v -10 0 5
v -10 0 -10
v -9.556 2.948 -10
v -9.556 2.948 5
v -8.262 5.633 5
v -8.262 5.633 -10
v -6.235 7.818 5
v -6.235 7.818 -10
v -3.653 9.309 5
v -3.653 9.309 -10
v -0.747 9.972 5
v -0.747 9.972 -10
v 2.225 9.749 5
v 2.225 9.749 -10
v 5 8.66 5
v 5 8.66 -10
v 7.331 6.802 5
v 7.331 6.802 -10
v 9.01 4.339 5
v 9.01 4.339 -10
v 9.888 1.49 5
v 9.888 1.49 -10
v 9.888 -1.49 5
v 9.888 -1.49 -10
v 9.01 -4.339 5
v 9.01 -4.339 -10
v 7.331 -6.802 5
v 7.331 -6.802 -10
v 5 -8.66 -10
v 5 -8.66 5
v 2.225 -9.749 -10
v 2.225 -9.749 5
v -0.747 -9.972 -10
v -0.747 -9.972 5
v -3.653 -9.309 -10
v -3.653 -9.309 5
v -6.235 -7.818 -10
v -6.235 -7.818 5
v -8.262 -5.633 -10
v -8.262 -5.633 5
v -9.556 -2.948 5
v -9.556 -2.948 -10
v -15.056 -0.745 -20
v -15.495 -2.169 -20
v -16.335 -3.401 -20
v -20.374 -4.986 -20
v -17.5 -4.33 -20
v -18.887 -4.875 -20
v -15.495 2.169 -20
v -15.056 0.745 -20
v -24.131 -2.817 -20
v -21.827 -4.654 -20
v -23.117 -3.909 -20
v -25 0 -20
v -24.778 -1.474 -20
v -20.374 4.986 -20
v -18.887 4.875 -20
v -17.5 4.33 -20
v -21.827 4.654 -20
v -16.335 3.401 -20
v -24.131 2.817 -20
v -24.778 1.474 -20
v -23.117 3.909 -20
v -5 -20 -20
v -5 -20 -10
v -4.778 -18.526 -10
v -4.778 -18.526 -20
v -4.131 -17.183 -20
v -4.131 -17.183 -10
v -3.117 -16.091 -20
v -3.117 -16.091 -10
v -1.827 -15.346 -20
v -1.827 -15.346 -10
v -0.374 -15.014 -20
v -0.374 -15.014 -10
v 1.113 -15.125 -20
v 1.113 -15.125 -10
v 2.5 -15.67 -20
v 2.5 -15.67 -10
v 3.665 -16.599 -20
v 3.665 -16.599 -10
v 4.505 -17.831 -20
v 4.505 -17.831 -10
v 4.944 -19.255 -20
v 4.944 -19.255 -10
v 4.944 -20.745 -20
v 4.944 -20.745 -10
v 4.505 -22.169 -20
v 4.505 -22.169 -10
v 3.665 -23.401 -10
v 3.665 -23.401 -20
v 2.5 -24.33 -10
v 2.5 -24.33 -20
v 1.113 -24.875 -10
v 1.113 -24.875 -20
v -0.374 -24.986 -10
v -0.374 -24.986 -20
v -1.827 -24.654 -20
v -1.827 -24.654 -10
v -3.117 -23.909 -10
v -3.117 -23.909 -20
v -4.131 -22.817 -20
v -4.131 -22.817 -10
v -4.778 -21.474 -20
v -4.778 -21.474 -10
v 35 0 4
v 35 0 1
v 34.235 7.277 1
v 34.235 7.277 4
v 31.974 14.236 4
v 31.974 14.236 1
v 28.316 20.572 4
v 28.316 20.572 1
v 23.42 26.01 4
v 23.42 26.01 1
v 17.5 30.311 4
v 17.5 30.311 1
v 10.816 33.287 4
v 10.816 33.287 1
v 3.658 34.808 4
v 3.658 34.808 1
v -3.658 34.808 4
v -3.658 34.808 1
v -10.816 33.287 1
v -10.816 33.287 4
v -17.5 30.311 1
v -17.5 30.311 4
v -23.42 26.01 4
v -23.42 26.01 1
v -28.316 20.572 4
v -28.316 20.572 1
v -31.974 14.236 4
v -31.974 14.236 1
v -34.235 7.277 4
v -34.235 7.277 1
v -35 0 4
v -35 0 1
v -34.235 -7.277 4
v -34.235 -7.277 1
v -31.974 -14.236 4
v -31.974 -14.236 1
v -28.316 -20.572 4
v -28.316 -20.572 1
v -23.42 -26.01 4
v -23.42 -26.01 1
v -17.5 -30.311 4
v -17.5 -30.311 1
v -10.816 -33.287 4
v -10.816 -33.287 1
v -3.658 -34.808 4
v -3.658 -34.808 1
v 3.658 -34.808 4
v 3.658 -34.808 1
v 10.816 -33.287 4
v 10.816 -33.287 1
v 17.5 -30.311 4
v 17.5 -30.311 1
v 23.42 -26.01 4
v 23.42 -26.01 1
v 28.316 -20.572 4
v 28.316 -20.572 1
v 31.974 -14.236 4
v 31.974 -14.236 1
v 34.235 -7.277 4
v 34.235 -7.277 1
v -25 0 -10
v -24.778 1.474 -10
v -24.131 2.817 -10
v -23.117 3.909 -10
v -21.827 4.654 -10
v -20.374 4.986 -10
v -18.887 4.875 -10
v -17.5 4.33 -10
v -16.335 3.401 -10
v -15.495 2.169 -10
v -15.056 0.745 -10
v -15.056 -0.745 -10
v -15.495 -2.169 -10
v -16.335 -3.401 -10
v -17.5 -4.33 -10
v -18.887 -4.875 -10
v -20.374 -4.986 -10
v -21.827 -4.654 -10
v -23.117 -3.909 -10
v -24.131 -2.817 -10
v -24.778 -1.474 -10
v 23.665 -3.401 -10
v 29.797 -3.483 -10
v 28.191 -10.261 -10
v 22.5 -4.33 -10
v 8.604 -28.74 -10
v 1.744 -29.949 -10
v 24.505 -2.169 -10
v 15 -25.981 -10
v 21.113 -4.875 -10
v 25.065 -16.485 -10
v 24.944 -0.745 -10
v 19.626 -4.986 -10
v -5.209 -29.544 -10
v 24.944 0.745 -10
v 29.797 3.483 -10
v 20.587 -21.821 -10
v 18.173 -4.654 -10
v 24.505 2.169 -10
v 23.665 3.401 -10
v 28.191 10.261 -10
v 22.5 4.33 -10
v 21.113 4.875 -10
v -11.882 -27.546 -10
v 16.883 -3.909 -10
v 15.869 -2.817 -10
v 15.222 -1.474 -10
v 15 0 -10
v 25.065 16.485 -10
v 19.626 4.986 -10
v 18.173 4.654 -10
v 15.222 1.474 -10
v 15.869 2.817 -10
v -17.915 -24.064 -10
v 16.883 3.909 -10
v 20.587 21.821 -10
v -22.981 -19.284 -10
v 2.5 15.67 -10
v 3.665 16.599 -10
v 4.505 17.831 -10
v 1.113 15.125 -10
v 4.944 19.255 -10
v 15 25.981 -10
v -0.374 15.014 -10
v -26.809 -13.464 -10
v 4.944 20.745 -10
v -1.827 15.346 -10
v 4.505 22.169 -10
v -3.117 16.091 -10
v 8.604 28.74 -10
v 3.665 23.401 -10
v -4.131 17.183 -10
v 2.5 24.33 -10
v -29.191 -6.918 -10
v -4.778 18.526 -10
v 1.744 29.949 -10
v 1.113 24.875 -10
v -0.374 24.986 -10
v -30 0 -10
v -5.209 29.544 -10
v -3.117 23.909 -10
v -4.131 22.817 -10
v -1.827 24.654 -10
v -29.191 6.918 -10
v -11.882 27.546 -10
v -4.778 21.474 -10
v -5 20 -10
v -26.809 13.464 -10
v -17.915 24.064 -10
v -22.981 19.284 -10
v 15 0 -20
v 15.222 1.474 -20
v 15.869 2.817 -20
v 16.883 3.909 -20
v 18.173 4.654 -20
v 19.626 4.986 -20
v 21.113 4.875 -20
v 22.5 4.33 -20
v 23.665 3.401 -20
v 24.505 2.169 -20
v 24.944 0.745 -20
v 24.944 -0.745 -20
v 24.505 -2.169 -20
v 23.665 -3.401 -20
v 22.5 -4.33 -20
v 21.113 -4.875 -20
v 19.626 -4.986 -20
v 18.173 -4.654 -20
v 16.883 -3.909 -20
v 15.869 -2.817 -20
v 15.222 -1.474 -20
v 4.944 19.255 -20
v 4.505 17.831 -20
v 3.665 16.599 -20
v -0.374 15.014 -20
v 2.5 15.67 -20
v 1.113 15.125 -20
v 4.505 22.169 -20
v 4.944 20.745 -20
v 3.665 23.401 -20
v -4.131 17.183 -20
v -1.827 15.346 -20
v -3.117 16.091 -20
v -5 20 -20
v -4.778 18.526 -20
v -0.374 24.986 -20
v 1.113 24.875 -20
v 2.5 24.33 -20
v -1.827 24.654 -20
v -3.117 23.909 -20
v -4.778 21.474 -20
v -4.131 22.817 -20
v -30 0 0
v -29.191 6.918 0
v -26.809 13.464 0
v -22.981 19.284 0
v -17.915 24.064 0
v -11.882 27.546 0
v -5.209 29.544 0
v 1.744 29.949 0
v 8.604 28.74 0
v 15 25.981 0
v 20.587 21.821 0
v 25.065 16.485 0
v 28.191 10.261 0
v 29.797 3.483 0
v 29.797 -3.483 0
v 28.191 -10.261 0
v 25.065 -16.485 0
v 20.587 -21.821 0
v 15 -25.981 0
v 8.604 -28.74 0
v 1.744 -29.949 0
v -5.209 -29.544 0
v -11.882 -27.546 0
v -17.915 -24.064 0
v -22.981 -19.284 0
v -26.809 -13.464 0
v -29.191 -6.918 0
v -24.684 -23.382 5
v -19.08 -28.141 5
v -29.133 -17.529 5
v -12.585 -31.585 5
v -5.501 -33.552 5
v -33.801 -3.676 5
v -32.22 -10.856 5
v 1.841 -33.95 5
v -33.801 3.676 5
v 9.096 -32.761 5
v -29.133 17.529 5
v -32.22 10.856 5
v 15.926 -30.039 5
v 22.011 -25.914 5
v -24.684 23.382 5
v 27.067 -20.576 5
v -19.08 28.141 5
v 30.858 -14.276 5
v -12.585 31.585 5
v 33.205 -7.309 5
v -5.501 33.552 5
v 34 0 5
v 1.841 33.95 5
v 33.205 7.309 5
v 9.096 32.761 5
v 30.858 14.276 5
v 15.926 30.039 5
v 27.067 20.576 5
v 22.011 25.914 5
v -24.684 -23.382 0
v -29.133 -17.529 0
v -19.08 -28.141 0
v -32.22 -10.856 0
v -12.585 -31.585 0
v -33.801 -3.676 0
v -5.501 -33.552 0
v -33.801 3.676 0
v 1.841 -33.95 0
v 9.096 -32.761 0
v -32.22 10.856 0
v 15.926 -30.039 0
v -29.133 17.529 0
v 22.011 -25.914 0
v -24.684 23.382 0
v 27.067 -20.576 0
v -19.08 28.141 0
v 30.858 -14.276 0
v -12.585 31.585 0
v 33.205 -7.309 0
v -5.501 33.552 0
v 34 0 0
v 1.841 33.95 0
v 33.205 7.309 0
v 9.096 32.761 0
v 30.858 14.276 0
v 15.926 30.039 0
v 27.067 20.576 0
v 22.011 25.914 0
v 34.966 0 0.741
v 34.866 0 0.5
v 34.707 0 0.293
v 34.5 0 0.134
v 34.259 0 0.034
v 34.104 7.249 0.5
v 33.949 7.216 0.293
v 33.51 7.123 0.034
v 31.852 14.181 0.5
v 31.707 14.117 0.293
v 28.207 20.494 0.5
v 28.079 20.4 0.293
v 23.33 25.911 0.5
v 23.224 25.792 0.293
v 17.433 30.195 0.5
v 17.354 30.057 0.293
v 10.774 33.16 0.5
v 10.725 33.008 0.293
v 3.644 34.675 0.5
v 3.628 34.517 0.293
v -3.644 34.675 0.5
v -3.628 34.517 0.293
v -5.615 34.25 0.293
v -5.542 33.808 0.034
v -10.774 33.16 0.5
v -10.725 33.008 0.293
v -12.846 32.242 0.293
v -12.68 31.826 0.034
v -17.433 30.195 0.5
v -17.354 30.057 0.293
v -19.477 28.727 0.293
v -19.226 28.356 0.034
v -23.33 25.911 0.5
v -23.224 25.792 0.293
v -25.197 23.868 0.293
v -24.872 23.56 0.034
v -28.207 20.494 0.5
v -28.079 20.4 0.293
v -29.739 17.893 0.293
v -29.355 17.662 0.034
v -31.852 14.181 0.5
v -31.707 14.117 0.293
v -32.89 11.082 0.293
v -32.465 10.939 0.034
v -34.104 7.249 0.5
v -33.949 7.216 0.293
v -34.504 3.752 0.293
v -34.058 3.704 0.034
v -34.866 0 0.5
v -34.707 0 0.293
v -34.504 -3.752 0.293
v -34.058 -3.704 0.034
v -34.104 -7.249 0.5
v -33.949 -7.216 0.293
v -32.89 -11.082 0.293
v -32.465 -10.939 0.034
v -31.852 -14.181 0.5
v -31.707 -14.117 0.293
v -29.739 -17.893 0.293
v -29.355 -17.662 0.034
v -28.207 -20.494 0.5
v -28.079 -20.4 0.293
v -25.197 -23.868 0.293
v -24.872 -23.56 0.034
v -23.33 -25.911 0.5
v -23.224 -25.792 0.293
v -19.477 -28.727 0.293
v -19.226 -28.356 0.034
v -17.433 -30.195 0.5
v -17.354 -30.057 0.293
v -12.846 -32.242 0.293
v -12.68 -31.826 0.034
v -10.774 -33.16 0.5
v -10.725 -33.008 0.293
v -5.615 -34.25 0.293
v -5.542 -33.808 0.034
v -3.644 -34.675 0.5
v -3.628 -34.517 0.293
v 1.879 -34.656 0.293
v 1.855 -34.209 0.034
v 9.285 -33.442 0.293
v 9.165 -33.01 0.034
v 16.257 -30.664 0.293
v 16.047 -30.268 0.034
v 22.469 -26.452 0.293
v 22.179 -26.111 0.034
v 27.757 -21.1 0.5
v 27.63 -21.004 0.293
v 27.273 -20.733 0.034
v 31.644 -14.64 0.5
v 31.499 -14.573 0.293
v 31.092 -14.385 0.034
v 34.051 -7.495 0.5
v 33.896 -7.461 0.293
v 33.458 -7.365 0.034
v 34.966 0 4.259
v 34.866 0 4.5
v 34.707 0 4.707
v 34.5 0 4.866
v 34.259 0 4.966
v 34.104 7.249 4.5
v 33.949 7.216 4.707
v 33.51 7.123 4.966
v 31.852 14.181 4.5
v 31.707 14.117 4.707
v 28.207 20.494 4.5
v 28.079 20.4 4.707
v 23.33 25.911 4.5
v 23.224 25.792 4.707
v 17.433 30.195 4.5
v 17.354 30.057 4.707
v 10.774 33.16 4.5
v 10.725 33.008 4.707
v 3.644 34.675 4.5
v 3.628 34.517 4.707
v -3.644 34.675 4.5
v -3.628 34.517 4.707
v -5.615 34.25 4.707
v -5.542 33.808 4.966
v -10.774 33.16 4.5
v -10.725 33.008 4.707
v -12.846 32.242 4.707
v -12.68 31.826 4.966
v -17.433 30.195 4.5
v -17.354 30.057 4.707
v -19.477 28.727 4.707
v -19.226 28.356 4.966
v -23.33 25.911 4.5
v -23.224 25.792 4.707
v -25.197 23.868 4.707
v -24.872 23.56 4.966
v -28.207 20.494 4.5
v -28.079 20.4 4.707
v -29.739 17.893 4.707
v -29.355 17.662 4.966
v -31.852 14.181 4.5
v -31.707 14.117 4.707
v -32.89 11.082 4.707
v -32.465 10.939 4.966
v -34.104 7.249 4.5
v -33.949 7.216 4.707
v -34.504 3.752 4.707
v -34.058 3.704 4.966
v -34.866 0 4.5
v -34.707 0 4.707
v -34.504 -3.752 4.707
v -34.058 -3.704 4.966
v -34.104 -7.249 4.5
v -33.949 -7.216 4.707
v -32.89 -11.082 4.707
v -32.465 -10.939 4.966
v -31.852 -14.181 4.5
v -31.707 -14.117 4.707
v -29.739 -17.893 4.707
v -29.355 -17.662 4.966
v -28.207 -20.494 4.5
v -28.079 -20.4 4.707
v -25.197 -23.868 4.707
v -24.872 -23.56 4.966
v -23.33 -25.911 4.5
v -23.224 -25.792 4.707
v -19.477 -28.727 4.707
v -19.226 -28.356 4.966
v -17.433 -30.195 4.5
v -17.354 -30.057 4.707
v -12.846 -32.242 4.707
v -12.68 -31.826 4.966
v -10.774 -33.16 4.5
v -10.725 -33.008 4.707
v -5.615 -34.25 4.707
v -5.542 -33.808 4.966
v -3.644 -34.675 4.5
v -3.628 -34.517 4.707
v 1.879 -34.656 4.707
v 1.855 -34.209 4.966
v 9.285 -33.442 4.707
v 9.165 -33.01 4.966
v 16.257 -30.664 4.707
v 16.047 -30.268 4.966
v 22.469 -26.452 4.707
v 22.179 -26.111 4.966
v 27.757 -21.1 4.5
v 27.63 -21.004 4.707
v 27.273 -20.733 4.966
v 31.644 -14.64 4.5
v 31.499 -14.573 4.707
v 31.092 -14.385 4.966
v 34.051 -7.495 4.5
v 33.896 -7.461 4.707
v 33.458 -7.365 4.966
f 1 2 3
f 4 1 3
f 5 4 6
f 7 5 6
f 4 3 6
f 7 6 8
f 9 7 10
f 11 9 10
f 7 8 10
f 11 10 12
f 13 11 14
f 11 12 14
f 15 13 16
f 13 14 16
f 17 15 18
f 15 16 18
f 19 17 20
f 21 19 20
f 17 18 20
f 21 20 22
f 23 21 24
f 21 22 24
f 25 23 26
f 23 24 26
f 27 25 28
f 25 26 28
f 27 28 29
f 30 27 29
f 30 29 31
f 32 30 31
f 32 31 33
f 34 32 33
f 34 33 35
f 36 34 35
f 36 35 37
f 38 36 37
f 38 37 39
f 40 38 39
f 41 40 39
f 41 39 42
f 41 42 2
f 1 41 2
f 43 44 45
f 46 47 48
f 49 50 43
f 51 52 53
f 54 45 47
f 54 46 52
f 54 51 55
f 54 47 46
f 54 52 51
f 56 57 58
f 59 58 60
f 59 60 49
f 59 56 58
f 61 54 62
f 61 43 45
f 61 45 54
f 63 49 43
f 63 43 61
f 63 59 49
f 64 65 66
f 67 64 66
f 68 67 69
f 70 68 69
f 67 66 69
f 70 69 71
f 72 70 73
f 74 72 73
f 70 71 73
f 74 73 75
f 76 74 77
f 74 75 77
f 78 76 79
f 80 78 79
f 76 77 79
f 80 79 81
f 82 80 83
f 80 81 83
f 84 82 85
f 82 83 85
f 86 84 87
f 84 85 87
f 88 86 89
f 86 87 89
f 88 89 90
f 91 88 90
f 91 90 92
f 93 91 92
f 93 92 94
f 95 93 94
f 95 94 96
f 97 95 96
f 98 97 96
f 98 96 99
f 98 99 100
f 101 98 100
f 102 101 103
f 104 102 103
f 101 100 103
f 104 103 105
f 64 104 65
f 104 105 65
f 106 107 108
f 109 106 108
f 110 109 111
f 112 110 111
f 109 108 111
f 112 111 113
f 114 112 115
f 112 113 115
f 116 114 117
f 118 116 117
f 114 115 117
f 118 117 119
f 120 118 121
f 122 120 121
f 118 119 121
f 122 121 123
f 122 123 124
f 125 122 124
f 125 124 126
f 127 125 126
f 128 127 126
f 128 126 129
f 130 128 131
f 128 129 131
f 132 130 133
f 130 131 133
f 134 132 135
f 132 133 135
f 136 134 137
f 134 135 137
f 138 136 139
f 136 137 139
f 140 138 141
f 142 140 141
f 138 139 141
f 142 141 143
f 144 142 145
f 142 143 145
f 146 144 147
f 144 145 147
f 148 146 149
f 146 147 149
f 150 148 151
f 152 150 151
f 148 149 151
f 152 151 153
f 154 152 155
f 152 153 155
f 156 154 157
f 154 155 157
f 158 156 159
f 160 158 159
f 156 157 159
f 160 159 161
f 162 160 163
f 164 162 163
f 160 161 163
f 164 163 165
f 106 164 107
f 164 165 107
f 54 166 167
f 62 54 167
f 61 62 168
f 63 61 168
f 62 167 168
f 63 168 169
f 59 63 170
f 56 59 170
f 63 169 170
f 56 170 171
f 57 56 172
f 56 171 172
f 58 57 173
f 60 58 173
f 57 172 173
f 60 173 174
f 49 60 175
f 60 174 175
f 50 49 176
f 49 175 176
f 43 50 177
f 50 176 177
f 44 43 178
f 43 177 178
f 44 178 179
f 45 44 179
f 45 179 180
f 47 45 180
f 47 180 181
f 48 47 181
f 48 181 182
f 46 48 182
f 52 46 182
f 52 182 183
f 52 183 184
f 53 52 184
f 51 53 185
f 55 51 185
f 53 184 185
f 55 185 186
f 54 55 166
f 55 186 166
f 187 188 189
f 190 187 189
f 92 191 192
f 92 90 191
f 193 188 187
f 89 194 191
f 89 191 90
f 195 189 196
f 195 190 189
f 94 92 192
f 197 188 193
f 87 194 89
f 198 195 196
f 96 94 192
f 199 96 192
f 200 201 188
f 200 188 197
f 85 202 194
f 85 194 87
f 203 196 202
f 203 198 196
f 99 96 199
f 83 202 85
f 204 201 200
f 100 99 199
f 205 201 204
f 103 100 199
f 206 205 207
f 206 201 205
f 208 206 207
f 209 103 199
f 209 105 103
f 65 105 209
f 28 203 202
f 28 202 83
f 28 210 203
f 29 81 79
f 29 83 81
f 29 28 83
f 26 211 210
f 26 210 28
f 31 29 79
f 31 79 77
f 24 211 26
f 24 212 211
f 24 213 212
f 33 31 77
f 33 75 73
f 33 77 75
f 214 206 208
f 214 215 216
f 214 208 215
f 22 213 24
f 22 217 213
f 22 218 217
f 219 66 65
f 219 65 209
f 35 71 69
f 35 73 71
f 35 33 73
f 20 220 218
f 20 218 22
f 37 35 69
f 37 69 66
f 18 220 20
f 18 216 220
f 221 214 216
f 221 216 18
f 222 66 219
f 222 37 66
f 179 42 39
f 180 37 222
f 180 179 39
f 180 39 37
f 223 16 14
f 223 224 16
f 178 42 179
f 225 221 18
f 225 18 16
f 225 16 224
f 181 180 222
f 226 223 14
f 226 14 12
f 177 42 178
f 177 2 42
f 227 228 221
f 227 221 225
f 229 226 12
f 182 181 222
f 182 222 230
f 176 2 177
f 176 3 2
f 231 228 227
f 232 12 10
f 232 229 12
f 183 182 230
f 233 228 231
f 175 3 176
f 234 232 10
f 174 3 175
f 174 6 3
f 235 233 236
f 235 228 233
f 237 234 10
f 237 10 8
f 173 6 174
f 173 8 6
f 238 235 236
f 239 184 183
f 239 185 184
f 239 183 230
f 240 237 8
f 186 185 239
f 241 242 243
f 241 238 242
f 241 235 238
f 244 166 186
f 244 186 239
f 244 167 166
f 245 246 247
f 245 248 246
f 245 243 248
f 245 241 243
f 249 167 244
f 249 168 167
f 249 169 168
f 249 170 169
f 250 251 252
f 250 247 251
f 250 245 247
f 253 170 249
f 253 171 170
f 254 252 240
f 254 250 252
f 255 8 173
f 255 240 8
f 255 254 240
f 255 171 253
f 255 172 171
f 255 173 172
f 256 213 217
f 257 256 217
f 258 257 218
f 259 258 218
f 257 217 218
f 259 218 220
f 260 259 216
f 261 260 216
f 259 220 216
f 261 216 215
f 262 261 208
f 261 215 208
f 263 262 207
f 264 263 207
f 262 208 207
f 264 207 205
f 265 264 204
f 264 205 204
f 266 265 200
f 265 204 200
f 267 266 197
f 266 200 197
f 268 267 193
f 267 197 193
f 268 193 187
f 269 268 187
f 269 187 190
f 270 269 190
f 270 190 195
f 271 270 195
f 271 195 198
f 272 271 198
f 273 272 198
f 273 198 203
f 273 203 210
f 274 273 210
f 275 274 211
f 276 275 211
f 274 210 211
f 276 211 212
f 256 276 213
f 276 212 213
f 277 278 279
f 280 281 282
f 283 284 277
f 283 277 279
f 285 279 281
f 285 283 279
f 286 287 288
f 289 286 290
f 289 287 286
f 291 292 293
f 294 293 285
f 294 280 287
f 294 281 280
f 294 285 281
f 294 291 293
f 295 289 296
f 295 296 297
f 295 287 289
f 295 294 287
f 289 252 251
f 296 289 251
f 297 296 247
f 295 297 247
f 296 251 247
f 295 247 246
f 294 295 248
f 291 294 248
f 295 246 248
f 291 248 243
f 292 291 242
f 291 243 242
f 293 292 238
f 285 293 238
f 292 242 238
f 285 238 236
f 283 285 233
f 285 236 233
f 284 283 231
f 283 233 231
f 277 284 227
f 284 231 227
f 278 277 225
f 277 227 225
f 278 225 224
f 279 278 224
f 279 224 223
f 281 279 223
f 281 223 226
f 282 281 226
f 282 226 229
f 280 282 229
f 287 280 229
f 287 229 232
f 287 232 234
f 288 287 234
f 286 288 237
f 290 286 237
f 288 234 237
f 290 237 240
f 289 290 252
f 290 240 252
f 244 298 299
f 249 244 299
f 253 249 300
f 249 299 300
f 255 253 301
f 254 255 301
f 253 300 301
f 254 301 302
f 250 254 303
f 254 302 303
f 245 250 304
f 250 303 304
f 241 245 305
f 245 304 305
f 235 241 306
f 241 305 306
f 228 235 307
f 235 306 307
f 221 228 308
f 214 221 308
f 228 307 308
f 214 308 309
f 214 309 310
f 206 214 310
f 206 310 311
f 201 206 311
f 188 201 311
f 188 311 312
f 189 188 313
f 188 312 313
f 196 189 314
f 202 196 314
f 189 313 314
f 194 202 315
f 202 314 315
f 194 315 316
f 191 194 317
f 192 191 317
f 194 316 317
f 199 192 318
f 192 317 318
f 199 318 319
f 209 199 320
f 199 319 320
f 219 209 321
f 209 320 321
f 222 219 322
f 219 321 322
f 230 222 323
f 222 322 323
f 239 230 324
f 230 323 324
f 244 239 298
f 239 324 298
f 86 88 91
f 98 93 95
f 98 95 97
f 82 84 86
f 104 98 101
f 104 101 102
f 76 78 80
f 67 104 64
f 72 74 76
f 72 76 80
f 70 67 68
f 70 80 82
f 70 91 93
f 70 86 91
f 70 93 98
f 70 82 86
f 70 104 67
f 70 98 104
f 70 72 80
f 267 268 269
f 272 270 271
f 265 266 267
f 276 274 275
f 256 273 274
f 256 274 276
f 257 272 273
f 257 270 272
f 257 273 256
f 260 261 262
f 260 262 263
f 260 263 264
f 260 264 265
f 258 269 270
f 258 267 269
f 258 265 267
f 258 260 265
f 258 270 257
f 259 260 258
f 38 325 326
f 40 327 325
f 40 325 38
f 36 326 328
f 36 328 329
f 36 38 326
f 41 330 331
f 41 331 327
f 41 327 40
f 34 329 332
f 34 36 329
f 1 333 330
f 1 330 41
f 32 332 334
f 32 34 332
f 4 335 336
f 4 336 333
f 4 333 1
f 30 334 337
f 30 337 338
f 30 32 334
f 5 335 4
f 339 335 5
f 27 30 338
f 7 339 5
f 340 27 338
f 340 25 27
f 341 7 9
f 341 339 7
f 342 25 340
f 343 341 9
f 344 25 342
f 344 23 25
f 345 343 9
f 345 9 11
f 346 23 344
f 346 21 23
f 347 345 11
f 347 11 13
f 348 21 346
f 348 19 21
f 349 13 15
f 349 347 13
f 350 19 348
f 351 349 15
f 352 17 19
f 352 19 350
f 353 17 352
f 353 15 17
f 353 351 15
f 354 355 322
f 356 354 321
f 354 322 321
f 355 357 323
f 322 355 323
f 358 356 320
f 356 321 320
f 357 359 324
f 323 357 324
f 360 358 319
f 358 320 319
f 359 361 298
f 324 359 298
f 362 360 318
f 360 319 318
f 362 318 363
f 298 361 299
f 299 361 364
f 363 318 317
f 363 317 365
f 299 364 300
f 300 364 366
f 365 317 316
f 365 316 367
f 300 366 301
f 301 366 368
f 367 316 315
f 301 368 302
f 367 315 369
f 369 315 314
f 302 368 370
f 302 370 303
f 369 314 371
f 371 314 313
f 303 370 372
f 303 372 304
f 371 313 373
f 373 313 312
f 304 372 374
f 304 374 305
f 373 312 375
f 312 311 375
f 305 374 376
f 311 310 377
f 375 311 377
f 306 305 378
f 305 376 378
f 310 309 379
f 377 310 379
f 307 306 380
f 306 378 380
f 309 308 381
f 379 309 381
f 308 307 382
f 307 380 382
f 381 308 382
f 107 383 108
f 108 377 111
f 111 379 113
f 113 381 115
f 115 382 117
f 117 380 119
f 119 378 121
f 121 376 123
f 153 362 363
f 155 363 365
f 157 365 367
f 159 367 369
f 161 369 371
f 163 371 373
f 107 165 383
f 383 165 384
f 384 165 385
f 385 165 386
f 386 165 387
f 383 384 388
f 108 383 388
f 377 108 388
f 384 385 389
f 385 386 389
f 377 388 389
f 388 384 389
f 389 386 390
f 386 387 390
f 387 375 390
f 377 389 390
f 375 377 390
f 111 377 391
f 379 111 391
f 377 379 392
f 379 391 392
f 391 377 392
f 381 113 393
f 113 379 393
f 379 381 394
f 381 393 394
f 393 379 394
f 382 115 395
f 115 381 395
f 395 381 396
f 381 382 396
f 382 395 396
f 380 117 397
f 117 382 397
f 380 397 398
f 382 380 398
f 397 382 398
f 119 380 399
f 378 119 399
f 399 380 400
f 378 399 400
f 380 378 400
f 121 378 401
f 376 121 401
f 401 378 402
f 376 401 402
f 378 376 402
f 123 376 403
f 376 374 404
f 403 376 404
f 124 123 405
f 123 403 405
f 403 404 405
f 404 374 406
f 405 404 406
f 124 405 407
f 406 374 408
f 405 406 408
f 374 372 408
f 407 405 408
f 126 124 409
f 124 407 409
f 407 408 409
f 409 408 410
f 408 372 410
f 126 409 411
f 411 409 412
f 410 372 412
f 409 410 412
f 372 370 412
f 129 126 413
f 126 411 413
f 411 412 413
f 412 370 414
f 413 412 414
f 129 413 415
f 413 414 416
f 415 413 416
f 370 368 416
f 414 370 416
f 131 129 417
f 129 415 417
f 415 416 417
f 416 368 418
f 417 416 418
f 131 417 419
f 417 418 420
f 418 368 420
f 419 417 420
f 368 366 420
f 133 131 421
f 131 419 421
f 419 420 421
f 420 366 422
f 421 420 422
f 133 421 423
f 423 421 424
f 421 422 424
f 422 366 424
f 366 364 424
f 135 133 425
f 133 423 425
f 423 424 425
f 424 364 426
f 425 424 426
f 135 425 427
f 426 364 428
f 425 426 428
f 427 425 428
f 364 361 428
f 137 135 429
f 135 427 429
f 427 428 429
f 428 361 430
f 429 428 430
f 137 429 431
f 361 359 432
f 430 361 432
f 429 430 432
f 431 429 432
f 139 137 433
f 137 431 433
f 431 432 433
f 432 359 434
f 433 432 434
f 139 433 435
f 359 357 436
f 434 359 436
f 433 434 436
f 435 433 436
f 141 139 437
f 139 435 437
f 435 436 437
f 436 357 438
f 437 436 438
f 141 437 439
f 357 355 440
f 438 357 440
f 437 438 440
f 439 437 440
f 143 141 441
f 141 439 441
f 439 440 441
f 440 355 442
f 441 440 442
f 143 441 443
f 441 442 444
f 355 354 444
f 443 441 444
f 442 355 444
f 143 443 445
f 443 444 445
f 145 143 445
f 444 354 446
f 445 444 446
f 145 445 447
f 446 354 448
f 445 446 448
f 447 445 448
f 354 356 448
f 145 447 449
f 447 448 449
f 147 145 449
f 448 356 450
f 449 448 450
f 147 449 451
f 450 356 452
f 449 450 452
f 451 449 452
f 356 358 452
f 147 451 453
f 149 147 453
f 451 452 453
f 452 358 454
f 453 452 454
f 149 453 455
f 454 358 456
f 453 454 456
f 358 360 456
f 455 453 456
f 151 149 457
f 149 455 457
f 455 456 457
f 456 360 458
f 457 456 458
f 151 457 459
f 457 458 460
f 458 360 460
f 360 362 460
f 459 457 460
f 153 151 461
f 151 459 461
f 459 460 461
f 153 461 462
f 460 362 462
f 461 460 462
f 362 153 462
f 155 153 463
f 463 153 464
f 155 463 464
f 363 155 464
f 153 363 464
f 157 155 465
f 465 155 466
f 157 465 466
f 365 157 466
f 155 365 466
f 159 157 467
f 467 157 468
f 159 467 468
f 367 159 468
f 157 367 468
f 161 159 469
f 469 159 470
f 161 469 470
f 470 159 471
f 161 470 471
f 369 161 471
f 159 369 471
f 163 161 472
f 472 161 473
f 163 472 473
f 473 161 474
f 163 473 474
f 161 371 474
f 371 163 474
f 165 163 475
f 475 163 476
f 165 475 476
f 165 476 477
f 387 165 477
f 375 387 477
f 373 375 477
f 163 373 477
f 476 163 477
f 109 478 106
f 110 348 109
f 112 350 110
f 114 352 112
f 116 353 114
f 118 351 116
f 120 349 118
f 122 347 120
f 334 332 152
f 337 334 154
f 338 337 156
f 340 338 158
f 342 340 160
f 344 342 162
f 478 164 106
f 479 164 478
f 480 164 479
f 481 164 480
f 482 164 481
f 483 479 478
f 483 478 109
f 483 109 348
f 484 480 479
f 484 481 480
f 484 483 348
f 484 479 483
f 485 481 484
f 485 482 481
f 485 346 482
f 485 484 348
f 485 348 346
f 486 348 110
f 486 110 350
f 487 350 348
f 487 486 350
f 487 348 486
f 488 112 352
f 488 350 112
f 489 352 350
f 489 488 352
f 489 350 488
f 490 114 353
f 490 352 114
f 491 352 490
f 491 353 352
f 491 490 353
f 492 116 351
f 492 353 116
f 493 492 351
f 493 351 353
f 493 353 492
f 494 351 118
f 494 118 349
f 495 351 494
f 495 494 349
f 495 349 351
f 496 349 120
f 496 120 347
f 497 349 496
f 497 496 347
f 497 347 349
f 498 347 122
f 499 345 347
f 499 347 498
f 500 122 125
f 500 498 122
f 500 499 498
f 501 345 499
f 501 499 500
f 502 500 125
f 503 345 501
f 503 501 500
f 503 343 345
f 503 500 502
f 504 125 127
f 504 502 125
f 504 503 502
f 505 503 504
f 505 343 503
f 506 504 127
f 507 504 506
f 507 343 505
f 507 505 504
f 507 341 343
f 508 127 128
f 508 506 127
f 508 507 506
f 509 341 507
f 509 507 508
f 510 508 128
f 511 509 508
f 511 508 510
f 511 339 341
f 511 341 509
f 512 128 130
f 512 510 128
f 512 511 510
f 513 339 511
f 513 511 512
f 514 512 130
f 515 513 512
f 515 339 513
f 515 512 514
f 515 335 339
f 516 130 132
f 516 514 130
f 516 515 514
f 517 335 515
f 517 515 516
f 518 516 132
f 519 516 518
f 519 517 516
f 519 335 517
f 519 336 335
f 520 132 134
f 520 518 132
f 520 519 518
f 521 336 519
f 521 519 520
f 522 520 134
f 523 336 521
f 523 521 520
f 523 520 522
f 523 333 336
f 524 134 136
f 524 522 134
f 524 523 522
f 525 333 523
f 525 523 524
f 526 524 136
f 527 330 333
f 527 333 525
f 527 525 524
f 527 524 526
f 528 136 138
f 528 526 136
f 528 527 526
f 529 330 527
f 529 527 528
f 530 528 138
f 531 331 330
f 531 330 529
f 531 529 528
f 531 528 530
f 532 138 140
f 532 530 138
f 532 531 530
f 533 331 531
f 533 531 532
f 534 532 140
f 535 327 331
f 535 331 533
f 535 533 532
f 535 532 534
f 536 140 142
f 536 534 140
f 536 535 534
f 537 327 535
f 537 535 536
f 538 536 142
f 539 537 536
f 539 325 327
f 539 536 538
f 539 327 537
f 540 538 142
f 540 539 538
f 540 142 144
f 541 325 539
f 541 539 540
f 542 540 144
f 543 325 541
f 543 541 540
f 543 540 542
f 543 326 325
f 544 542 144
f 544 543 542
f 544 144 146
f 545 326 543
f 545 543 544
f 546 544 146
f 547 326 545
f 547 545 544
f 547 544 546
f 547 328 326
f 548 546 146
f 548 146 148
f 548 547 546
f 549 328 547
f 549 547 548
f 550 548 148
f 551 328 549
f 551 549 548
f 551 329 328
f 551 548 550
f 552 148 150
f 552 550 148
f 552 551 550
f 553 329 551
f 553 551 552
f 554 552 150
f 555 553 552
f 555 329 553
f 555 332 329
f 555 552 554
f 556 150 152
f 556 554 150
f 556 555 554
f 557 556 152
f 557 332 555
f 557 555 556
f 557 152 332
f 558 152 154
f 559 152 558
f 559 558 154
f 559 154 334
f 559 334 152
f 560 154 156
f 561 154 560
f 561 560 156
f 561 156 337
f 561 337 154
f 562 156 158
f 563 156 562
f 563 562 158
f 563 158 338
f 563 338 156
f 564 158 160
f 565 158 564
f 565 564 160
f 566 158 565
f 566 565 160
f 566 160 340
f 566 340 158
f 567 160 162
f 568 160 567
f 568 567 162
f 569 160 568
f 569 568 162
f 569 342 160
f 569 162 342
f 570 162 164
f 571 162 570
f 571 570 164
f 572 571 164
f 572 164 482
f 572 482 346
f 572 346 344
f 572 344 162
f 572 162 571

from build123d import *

# Parameters (mm, degrees)
SKETCH1_R           = 35
BOSS_EXTRUDE1_DEPTH = 5
FILLET1_R           = 1
SKETCH2_R           = 30
BOSS_EXTRUDE2_DEPTH = 10
SKETCH3_R           = 5
BOSS_EXTRUDE3_DEPTH = 10
SKETCH4_R           = 10
CUT_EXTRUDE1_DEPTH  = 16


with BuildPart() as part:
    # Sketch1 → Boss-Extrude1 (new body)
    with BuildSketch(Plane.XY):
        Circle(SKETCH1_R)
    extrude(amount=BOSS_EXTRUDE1_DEPTH)

    # Fillet1
    fillet1_edges = [part.edges().sort_by_distance(p)[0] for p in [
        (-35, 0, 0),
        (-35, 0, 5),
    ]]
    fillet(fillet1_edges, radius=FILLET1_R)

    # Sketch2 → Boss-Extrude2 (add)
    with BuildSketch(Plane(origin=(0, 0, 0), x_dir=(-1, 0, 0), z_dir=(0, 0, -1))):
        Circle(SKETCH2_R)
    extrude(amount=BOSS_EXTRUDE2_DEPTH)

    # Sketch3 → Boss-Extrude3 (add)
    with BuildSketch(Plane(origin=(0, 0, -10), x_dir=(-1, 0, 0), z_dir=(0, 0, -1))):
        with Locations((0, 20)):
            Circle(SKETCH3_R)
        with Locations((20, 0)):
            Circle(SKETCH3_R)
        with Locations((0, -20)):
            Circle(SKETCH3_R)
        with Locations((-20, 0)):
            Circle(SKETCH3_R)
    extrude(amount=BOSS_EXTRUDE3_DEPTH)

    # Sketch4 → Cut-Extrude1 (cut, through all)
    with BuildSketch(Plane(origin=(0, 0, -10), x_dir=(-1, 0, 0), z_dir=(0, 0, -1))):
        Circle(SKETCH4_R)
    extrude(amount=-CUT_EXTRUDE1_DEPTH, mode=Mode.SUBTRACT)


solid = part.part
